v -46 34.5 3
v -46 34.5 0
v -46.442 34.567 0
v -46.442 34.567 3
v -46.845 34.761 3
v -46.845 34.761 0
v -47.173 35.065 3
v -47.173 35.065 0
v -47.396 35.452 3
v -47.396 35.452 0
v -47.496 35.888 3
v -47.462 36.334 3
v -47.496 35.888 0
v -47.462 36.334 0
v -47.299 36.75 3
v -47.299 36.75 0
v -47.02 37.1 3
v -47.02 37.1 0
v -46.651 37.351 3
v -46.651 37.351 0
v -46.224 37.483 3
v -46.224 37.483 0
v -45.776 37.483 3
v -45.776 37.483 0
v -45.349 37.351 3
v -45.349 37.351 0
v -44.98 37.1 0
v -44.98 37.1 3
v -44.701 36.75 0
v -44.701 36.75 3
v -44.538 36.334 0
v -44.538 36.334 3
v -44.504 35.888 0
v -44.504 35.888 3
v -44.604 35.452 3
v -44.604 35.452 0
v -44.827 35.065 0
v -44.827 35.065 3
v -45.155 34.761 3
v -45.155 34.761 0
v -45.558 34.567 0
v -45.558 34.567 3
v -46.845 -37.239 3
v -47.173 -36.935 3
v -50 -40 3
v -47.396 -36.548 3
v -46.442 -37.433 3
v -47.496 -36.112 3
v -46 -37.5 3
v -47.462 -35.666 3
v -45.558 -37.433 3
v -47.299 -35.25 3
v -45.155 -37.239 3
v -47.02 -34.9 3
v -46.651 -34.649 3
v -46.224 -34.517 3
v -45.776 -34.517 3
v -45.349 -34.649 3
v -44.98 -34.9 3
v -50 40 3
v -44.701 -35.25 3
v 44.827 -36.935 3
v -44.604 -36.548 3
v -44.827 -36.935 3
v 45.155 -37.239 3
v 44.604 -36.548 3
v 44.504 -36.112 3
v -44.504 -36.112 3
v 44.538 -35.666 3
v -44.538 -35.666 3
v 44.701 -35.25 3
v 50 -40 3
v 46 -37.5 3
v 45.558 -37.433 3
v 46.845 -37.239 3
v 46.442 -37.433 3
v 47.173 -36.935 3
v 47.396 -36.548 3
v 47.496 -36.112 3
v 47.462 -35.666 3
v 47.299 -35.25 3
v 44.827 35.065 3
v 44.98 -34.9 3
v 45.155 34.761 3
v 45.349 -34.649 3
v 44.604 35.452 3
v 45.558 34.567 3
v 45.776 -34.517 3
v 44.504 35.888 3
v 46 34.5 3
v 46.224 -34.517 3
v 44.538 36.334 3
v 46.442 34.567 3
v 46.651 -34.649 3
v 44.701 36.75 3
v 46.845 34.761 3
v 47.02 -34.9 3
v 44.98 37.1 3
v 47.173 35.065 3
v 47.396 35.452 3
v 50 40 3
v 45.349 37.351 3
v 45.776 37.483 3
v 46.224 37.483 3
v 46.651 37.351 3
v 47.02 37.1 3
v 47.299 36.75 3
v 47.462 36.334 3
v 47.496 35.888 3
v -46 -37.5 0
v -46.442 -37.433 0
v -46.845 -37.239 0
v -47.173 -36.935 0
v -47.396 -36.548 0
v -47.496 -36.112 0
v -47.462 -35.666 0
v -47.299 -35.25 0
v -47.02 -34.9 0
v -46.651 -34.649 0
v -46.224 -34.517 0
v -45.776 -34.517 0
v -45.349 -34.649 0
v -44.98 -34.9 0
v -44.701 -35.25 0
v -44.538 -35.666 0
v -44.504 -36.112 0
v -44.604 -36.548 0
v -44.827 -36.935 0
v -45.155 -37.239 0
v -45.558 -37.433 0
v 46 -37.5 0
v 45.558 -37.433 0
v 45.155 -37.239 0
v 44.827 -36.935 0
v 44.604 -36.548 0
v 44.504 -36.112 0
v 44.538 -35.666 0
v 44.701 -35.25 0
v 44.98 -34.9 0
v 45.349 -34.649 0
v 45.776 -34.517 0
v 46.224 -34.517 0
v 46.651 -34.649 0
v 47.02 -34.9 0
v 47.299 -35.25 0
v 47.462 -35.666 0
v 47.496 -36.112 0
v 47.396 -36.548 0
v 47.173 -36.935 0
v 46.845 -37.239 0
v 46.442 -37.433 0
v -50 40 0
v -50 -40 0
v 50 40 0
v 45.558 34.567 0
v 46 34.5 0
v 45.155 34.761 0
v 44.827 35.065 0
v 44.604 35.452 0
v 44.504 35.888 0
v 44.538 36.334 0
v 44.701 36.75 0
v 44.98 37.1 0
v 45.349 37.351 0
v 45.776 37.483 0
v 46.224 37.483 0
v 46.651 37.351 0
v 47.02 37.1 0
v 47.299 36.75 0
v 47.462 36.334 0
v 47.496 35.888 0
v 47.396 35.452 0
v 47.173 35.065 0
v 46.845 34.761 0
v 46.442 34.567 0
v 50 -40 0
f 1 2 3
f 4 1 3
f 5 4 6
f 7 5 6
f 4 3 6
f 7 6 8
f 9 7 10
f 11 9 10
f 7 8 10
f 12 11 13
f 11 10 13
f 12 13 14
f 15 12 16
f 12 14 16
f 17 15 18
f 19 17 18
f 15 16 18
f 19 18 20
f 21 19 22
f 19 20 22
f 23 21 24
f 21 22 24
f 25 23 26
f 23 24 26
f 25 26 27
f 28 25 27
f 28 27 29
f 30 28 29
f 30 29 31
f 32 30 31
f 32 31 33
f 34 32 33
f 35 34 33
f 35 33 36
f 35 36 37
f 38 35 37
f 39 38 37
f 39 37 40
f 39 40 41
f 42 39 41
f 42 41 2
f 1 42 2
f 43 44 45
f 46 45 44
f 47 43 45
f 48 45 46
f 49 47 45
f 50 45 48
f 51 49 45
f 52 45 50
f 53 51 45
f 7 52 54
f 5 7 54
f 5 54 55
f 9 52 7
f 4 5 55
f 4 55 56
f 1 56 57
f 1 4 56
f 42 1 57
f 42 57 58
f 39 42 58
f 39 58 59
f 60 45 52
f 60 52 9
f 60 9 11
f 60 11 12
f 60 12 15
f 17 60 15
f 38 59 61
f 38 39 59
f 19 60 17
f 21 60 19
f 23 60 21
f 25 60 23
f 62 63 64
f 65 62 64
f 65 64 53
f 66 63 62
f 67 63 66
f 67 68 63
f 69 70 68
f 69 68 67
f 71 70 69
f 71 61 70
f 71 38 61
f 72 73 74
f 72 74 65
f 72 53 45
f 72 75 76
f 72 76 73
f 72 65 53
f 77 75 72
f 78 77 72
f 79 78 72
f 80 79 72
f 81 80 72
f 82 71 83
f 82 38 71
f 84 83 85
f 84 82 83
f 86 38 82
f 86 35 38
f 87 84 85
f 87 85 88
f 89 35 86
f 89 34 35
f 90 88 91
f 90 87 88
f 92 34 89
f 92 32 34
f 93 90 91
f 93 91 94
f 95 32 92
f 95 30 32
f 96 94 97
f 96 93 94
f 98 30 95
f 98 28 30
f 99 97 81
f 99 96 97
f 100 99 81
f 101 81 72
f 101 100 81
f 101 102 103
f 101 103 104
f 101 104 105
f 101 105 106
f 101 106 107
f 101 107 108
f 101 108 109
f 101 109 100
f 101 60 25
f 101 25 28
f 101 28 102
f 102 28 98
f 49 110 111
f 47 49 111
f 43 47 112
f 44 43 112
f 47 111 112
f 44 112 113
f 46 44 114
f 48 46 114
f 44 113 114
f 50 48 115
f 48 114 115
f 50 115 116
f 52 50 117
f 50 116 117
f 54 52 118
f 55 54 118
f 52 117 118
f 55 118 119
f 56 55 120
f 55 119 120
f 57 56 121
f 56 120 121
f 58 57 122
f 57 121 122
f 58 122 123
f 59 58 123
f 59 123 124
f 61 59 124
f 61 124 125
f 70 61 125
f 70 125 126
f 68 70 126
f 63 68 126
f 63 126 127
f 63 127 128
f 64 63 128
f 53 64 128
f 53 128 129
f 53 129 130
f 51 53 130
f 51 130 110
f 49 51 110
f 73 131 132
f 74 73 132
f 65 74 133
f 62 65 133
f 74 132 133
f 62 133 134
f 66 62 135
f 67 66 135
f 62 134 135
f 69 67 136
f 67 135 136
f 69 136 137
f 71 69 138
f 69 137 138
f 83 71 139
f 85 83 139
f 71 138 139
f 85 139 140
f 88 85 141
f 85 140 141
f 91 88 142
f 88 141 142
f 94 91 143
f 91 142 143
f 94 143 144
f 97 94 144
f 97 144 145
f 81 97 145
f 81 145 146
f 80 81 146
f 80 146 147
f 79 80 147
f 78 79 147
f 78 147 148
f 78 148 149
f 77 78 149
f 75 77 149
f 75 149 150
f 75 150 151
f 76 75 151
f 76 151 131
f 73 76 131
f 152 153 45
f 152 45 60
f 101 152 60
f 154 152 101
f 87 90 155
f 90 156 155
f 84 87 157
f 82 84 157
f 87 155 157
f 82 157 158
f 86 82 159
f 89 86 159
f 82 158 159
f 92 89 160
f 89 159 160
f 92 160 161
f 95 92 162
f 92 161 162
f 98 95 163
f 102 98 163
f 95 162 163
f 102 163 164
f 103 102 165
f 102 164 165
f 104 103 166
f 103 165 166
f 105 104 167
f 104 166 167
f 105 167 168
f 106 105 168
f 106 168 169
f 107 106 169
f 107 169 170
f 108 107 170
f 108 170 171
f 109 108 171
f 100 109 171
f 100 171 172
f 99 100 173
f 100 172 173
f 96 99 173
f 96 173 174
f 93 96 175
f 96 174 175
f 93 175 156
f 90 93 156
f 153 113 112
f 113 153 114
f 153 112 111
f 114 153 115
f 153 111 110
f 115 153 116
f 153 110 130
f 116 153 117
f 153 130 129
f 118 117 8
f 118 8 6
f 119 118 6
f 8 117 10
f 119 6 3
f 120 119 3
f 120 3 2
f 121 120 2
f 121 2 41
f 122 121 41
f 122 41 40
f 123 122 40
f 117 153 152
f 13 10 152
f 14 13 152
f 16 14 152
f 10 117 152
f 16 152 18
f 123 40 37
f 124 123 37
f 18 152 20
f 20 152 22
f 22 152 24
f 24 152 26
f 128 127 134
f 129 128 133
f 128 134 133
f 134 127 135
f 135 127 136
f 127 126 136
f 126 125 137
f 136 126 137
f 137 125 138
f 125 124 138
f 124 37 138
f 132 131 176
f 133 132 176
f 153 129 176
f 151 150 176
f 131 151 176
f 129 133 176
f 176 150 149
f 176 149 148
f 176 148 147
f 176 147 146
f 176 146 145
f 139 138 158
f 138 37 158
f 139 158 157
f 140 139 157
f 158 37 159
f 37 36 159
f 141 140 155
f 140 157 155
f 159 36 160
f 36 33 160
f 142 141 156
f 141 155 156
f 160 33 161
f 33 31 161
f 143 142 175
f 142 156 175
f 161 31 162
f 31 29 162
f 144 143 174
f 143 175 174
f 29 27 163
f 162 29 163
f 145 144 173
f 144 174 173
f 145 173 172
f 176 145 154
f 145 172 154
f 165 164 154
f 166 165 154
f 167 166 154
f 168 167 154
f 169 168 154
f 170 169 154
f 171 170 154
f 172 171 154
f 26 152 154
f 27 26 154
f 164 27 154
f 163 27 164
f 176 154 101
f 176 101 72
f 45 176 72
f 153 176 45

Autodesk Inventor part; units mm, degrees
ref_plane "YZ Plane" through (0, 0, 0) normal (1, 0, 0) x (0, 1, 0)
ref_plane "XZ Plane" through (0, 0, 0) normal (0, 1, 0) x (-1, 0, 0)
ref_plane "XY Plane" through (0, 0, 0) normal (0, 0, 1) x (1, 0, 0)
sketch "スケッチ1" plane through (0, 0, 0) normal (0, 0, 1) x (1, 0, 0)
  line L0 (-50, 40) -> (50, 40)
  line L1 (50, 40) -> (50, -40)
  line L2 (50, -40) -> (-50, -40)
  line L3 (-50, -40) -> (-50, 40)
  line L4 (-50, 40) -> (50, -40) construction
  line L5 (50, 40) -> (-50, -40) construction
  point P0 (0, 0)
  dimension "d0" = 100
  dimension "d1" = 80
extrude "押し出し1" add sketch "スケッチ1" along normal blind 3
sketch "スケッチ2" plane through (0, 0, 3) normal (0, 0, 1) x (1, 0, 0)
  line L0 (-50, 40) -> (-50, -40) projected
  line L1 (50, 40) -> (-50, 40) projected
  line L2 (50, -40) -> (50, 40) projected
  line L3 (-50, -40) -> (50, -40) projected
  point P0 (0, 0)
  point P1 (-46, 36)
  point P2 (-46, -36)
  point P3 (46, -36)
  point P4 (46, -36)
  point P5 (46, 36)
  dimension "d4" = 4
  dimension "d5" = 4
  dimension "d6" = 4
  dimension "d7" = 4
hole "穴1" at (-46, 36, 3) at (-46, -36, 3) at (46, -36, 3) at (46, 36, 3) direction (0, 0, -1) diameter 3 end through all
properties part number "Main board ver2"
